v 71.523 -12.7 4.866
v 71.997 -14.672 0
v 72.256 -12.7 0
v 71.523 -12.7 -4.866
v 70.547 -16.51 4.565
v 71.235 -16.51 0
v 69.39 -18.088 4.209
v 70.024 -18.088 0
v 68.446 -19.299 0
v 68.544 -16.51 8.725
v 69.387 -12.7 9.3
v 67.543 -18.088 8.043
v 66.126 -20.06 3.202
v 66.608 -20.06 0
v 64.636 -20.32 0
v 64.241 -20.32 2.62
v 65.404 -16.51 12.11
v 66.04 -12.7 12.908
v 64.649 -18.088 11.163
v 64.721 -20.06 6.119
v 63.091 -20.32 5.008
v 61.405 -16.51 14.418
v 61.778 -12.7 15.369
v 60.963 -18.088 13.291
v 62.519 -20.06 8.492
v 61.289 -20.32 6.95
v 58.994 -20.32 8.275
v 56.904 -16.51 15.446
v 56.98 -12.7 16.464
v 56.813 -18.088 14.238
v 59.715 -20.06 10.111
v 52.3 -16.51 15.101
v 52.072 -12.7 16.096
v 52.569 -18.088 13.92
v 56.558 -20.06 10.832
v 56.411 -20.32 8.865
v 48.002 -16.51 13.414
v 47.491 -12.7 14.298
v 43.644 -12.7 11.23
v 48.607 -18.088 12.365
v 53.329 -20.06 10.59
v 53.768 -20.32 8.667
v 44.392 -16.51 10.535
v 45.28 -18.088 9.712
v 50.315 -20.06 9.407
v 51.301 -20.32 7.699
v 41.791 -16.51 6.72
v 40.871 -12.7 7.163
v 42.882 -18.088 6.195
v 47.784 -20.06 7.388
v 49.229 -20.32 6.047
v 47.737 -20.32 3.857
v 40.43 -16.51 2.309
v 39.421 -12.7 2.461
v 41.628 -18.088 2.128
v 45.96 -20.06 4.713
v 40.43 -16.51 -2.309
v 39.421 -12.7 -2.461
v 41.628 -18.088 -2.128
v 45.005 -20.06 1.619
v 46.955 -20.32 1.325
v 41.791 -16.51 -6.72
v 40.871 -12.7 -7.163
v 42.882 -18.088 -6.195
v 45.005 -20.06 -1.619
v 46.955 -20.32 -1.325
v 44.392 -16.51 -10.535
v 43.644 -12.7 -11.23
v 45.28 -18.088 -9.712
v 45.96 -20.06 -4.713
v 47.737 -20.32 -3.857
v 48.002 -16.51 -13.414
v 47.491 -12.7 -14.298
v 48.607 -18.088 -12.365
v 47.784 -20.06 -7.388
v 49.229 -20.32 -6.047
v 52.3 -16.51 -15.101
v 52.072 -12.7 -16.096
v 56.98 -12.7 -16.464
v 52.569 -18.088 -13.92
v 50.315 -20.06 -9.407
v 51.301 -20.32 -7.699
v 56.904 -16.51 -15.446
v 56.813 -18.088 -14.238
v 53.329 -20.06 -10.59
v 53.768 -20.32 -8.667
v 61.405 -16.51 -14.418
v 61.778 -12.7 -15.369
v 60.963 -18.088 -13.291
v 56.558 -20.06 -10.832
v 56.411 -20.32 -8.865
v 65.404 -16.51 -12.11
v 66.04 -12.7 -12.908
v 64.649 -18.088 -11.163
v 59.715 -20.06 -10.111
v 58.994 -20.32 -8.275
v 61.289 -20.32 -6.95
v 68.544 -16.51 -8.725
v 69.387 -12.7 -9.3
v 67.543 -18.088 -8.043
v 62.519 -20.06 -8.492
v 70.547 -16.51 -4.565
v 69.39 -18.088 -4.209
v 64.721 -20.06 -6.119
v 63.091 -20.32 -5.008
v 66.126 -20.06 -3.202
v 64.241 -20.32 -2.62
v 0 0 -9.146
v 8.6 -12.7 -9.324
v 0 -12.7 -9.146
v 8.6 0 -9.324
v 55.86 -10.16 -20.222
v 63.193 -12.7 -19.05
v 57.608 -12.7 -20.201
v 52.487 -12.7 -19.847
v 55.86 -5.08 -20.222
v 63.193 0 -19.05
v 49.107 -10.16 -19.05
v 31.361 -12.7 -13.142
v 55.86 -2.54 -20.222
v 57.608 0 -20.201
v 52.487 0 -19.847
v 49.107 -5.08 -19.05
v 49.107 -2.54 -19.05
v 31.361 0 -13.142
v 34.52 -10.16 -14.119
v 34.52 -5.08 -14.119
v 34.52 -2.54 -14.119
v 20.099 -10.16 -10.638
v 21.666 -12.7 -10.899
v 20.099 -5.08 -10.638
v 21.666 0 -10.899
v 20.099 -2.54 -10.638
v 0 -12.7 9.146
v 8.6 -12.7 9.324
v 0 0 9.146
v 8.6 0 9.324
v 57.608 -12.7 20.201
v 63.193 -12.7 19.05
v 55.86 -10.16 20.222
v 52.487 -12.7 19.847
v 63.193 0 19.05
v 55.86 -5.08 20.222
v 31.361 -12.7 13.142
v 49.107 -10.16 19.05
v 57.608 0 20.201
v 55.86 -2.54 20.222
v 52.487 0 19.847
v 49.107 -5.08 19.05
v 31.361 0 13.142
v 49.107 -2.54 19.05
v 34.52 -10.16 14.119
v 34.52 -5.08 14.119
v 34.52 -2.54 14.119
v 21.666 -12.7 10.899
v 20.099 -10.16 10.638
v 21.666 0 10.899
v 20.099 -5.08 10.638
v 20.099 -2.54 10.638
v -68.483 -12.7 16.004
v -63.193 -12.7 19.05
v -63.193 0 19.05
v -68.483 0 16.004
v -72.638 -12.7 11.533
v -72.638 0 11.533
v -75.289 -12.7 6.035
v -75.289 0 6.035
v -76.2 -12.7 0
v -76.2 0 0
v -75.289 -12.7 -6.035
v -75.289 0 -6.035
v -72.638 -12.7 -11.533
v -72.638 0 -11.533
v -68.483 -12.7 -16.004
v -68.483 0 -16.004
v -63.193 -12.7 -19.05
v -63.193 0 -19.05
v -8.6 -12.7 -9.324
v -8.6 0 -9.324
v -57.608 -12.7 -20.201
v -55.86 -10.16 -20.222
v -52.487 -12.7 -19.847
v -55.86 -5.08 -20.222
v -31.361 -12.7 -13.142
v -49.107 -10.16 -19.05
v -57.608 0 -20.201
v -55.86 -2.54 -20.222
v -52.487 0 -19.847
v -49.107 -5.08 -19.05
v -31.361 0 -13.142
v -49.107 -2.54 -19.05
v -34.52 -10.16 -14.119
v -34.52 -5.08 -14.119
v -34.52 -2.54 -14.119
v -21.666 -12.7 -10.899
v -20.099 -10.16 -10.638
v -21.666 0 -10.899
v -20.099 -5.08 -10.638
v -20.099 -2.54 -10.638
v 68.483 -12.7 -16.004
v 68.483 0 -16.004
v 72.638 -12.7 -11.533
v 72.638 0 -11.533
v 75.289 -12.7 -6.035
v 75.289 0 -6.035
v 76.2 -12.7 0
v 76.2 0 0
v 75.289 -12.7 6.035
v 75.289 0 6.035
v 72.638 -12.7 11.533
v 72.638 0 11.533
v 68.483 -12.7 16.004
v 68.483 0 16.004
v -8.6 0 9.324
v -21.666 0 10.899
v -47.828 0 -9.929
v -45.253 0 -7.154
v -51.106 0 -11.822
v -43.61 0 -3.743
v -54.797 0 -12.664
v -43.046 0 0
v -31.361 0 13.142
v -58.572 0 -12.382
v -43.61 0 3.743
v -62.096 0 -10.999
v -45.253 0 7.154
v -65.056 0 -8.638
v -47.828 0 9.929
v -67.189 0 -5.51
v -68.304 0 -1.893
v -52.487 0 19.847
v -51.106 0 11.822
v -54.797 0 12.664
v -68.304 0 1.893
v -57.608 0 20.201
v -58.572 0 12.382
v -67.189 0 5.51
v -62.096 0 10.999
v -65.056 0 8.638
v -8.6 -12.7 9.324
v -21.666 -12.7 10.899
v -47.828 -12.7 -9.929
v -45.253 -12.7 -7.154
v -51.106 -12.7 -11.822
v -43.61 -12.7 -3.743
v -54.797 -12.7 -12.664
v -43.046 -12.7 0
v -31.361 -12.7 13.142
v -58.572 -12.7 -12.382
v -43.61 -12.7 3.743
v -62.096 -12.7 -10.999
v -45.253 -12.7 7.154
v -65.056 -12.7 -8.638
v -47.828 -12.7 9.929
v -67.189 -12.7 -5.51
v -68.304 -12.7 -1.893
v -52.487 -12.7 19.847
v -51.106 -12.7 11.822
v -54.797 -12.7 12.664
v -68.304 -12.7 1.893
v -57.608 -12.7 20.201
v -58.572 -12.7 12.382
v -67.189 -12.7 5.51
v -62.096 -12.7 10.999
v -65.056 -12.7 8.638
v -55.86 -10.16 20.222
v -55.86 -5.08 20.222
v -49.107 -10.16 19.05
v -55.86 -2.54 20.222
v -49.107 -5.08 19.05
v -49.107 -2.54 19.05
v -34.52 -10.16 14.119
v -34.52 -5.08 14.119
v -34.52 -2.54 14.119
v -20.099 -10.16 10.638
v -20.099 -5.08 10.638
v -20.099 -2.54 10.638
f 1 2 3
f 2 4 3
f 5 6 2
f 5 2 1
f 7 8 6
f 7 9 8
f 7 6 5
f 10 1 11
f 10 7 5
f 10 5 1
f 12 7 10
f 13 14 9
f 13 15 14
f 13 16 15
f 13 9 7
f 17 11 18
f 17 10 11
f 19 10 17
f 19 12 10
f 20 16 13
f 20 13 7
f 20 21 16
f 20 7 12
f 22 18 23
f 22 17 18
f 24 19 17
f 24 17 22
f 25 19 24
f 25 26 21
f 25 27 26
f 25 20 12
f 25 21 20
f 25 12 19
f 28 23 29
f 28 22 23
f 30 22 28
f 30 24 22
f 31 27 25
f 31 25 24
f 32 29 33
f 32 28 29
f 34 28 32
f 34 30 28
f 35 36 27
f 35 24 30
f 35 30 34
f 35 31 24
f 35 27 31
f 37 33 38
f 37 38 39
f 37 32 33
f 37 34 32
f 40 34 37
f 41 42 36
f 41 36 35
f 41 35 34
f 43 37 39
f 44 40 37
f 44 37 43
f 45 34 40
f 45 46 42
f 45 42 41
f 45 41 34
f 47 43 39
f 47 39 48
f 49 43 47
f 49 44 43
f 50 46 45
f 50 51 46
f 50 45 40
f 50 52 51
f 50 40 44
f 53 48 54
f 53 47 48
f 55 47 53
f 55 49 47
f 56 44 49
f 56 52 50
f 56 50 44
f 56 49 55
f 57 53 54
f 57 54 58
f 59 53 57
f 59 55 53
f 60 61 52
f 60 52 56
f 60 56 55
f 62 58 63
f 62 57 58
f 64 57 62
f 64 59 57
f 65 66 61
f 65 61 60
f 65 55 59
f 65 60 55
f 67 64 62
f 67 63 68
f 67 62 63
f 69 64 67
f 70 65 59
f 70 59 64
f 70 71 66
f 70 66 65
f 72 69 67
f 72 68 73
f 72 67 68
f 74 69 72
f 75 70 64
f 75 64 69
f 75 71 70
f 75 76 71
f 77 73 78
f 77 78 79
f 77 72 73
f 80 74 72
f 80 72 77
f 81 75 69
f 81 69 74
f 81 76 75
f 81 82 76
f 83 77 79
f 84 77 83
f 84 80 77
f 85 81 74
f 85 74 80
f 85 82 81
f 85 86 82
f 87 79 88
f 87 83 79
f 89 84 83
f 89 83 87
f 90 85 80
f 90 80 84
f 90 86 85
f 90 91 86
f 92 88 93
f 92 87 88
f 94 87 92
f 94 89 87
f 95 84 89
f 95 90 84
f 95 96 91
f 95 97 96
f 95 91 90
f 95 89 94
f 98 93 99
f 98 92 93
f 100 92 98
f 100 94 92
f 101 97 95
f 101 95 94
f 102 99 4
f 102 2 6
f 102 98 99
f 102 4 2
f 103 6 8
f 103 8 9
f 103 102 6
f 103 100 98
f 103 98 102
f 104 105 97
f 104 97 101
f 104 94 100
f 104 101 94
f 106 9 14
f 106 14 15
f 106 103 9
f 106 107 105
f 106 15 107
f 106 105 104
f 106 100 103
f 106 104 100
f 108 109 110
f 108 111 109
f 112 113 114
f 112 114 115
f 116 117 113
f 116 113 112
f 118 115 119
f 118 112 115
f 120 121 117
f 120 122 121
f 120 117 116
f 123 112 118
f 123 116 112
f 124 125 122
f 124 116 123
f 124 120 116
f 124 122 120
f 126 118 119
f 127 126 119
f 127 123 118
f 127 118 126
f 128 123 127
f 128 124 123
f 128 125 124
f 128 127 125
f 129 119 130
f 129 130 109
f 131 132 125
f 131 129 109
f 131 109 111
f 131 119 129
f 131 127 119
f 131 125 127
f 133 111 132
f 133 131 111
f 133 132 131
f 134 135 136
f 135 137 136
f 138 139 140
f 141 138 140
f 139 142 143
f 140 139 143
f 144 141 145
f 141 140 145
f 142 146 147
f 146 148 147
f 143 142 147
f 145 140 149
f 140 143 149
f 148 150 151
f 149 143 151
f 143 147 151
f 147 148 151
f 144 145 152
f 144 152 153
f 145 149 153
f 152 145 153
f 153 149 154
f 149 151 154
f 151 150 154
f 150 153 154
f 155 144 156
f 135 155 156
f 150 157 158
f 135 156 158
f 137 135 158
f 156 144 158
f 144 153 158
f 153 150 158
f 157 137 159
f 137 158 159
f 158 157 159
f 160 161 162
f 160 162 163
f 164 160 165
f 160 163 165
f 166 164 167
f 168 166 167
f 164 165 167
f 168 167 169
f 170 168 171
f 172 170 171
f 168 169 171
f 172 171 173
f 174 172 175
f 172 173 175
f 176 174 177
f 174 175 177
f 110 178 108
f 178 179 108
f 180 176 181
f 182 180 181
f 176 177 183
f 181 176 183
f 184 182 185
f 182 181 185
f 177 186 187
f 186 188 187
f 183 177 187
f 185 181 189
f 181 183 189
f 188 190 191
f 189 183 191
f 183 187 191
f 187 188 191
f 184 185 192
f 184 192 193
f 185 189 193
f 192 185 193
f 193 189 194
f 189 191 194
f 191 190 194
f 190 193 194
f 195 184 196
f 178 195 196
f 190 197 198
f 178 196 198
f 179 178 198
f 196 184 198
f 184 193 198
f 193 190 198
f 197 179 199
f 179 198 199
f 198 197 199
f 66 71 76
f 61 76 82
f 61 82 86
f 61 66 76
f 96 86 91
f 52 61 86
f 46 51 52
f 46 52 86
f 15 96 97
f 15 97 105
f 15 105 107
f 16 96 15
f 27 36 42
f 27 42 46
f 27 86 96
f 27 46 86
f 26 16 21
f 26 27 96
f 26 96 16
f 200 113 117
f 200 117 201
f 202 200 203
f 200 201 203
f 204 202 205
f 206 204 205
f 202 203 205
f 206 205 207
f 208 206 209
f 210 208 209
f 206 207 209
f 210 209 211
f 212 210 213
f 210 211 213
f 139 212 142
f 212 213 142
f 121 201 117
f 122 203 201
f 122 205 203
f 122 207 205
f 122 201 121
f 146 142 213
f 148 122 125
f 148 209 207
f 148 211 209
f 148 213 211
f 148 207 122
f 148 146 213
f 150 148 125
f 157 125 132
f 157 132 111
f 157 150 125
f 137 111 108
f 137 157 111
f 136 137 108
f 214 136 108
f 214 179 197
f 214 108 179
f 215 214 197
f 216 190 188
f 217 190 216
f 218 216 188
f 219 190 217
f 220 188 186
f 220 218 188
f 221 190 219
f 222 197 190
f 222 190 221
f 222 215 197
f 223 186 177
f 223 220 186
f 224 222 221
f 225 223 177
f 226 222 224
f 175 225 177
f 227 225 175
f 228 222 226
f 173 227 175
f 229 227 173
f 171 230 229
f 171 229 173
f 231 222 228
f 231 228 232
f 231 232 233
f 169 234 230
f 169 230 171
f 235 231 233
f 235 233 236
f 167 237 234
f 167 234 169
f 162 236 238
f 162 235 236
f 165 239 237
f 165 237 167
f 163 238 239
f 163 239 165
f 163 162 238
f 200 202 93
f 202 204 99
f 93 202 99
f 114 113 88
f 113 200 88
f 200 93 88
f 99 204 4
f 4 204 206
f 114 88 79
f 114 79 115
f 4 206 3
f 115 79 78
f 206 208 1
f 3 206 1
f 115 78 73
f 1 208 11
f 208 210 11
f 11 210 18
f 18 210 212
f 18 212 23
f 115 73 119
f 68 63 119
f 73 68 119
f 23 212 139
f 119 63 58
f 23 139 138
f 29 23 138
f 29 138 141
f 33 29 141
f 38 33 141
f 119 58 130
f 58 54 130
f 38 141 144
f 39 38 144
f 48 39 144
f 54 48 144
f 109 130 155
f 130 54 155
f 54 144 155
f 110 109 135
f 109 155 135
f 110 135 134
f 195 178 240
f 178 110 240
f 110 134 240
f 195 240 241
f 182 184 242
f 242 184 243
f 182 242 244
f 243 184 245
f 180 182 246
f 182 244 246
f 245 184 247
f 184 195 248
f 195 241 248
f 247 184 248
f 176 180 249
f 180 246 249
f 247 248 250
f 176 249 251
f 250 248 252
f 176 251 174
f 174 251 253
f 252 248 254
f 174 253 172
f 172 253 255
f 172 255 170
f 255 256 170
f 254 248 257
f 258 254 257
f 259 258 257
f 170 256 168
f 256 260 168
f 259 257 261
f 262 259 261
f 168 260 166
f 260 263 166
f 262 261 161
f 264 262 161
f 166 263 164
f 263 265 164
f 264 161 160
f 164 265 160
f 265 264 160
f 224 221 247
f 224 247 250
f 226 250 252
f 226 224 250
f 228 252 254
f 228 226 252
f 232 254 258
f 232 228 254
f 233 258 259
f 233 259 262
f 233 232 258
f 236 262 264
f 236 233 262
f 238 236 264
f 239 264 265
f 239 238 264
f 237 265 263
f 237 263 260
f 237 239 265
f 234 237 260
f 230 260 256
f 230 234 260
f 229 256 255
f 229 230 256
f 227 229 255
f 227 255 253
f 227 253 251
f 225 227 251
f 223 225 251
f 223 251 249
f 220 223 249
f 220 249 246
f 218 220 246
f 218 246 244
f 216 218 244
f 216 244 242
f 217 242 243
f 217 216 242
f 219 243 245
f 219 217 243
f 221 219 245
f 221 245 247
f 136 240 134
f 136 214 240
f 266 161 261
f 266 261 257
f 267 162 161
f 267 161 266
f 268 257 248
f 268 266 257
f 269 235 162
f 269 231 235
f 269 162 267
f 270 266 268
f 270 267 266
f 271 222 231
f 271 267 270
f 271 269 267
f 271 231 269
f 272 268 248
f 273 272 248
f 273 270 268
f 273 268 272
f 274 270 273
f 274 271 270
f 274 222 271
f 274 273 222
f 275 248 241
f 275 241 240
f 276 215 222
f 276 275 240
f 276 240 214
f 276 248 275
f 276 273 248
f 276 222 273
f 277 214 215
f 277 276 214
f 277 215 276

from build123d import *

# Parameters (mm, degrees)
F0_R     = 12.7
F0_R_2   = 16.51
F1_DEPTH = 12.7
F2_DEPTH = 20.32
F3_R     = 7.61999


# Not quite as in the source:
# - a fillet or chamfer is up to 0.001 mm smaller than in the source, because OpenCascade refuses the exact size


with BuildPart() as f1:
    # F0 (on Front) → F1 (new body)
    with BuildSketch(Plane.XZ):
        with BuildLine():
            add(Edge.make_bspline(
                [(63.1930127424, -19.05), (57.8929819167, -20.9148749709), (49.1822585518, -19.6780685204), (34.4123652883, -13.7010865969), (20.7204562035, -10.3509186108), (5.798157397, -8.9775289718), (1.5977957695, -9.0970061045), (0, -9.1456407681)],
                knots=[0, 0, 0, 0, 0.2119684652, 0.4335943825, 0.6511337867, 0.8674060842, 1, 1, 1, 1], degree=3))
            ThreePointArc((63.1930127424, -19.05), (76.2, 0), (63.1930127424, 19.05))
            add(Edge.make_bspline(
                [(63.1930127424, 19.05), (57.8929819167, 20.9148749709), (49.1822585518, 19.6780685204), (34.4123652883, 13.7010865969), (20.7204562035, 10.3509186108), (5.798157397, 8.9775289718), (1.5977957695, 9.0970061045), (0, 9.1456407681)],
                knots=[0, 0, 0, 0, 0.2119684652, 0.4335943825, 0.6511337867, 0.8674060842, 1, 1, 1, 1], degree=3))
            add(Edge.make_bspline(
                [(-63.1930127424, 19.05), (-57.8929819167, 20.9148749709), (-49.1822585518, 19.6780685204), (-34.4123652883, 13.7010865969), (-20.7204562035, 10.3509186108), (-5.798157397, 8.9775289718), (-1.5977957695, 9.0970061045), (0, 9.1456407681)],
                knots=[0, 0, 0, 0, 0.2119684652, 0.4335943825, 0.6511337867, 0.8674060842, 1, 1, 1, 1], degree=3))
            ThreePointArc((-63.1930127424, 19.05), (-76.2, 0), (-63.1930127424, -19.05))
            add(Edge.make_bspline(
                [(-63.1930127424, -19.05), (-57.8929819167, -20.9148749709), (-49.1822585518, -19.6780685204), (-34.4123652883, -13.7010865969), (-20.7204562035, -10.3509186108), (-5.798157397, -8.9775289718), (-1.5977957695, -9.0970061045), (0, -9.1456407681)],
                knots=[0, 0, 0, 0, 0.2119684652, 0.4335943825, 0.6511337867, 0.8674060842, 1, 1, 1, 1], degree=3))
        make_face()
        with Locations((-55.7462159306, 0)):
            Circle(F0_R, mode=Mode.SUBTRACT)
        with Locations((55.7462159306, 0)):
            Circle(F0_R_2, mode=Mode.SUBTRACT)
    extrude(amount=F1_DEPTH)

    # F0 (on Front) → F2 (join)
    with BuildSketch(Plane.XZ):
        with Locations((55.7462159306, 0)):
            Circle(F0_R_2)
    extrude(amount=F2_DEPTH)

    # F3 (radius 7.62 in the source; OpenCascade refuses exactly that, so slightly less here)
    f3_edges = [f1.edges().sort_by_distance(p)[0] for p in [
        (39.236216, -20.32, 0),
    ]]
    fillet(f3_edges, radius=F3_R)


solid = f1.part
